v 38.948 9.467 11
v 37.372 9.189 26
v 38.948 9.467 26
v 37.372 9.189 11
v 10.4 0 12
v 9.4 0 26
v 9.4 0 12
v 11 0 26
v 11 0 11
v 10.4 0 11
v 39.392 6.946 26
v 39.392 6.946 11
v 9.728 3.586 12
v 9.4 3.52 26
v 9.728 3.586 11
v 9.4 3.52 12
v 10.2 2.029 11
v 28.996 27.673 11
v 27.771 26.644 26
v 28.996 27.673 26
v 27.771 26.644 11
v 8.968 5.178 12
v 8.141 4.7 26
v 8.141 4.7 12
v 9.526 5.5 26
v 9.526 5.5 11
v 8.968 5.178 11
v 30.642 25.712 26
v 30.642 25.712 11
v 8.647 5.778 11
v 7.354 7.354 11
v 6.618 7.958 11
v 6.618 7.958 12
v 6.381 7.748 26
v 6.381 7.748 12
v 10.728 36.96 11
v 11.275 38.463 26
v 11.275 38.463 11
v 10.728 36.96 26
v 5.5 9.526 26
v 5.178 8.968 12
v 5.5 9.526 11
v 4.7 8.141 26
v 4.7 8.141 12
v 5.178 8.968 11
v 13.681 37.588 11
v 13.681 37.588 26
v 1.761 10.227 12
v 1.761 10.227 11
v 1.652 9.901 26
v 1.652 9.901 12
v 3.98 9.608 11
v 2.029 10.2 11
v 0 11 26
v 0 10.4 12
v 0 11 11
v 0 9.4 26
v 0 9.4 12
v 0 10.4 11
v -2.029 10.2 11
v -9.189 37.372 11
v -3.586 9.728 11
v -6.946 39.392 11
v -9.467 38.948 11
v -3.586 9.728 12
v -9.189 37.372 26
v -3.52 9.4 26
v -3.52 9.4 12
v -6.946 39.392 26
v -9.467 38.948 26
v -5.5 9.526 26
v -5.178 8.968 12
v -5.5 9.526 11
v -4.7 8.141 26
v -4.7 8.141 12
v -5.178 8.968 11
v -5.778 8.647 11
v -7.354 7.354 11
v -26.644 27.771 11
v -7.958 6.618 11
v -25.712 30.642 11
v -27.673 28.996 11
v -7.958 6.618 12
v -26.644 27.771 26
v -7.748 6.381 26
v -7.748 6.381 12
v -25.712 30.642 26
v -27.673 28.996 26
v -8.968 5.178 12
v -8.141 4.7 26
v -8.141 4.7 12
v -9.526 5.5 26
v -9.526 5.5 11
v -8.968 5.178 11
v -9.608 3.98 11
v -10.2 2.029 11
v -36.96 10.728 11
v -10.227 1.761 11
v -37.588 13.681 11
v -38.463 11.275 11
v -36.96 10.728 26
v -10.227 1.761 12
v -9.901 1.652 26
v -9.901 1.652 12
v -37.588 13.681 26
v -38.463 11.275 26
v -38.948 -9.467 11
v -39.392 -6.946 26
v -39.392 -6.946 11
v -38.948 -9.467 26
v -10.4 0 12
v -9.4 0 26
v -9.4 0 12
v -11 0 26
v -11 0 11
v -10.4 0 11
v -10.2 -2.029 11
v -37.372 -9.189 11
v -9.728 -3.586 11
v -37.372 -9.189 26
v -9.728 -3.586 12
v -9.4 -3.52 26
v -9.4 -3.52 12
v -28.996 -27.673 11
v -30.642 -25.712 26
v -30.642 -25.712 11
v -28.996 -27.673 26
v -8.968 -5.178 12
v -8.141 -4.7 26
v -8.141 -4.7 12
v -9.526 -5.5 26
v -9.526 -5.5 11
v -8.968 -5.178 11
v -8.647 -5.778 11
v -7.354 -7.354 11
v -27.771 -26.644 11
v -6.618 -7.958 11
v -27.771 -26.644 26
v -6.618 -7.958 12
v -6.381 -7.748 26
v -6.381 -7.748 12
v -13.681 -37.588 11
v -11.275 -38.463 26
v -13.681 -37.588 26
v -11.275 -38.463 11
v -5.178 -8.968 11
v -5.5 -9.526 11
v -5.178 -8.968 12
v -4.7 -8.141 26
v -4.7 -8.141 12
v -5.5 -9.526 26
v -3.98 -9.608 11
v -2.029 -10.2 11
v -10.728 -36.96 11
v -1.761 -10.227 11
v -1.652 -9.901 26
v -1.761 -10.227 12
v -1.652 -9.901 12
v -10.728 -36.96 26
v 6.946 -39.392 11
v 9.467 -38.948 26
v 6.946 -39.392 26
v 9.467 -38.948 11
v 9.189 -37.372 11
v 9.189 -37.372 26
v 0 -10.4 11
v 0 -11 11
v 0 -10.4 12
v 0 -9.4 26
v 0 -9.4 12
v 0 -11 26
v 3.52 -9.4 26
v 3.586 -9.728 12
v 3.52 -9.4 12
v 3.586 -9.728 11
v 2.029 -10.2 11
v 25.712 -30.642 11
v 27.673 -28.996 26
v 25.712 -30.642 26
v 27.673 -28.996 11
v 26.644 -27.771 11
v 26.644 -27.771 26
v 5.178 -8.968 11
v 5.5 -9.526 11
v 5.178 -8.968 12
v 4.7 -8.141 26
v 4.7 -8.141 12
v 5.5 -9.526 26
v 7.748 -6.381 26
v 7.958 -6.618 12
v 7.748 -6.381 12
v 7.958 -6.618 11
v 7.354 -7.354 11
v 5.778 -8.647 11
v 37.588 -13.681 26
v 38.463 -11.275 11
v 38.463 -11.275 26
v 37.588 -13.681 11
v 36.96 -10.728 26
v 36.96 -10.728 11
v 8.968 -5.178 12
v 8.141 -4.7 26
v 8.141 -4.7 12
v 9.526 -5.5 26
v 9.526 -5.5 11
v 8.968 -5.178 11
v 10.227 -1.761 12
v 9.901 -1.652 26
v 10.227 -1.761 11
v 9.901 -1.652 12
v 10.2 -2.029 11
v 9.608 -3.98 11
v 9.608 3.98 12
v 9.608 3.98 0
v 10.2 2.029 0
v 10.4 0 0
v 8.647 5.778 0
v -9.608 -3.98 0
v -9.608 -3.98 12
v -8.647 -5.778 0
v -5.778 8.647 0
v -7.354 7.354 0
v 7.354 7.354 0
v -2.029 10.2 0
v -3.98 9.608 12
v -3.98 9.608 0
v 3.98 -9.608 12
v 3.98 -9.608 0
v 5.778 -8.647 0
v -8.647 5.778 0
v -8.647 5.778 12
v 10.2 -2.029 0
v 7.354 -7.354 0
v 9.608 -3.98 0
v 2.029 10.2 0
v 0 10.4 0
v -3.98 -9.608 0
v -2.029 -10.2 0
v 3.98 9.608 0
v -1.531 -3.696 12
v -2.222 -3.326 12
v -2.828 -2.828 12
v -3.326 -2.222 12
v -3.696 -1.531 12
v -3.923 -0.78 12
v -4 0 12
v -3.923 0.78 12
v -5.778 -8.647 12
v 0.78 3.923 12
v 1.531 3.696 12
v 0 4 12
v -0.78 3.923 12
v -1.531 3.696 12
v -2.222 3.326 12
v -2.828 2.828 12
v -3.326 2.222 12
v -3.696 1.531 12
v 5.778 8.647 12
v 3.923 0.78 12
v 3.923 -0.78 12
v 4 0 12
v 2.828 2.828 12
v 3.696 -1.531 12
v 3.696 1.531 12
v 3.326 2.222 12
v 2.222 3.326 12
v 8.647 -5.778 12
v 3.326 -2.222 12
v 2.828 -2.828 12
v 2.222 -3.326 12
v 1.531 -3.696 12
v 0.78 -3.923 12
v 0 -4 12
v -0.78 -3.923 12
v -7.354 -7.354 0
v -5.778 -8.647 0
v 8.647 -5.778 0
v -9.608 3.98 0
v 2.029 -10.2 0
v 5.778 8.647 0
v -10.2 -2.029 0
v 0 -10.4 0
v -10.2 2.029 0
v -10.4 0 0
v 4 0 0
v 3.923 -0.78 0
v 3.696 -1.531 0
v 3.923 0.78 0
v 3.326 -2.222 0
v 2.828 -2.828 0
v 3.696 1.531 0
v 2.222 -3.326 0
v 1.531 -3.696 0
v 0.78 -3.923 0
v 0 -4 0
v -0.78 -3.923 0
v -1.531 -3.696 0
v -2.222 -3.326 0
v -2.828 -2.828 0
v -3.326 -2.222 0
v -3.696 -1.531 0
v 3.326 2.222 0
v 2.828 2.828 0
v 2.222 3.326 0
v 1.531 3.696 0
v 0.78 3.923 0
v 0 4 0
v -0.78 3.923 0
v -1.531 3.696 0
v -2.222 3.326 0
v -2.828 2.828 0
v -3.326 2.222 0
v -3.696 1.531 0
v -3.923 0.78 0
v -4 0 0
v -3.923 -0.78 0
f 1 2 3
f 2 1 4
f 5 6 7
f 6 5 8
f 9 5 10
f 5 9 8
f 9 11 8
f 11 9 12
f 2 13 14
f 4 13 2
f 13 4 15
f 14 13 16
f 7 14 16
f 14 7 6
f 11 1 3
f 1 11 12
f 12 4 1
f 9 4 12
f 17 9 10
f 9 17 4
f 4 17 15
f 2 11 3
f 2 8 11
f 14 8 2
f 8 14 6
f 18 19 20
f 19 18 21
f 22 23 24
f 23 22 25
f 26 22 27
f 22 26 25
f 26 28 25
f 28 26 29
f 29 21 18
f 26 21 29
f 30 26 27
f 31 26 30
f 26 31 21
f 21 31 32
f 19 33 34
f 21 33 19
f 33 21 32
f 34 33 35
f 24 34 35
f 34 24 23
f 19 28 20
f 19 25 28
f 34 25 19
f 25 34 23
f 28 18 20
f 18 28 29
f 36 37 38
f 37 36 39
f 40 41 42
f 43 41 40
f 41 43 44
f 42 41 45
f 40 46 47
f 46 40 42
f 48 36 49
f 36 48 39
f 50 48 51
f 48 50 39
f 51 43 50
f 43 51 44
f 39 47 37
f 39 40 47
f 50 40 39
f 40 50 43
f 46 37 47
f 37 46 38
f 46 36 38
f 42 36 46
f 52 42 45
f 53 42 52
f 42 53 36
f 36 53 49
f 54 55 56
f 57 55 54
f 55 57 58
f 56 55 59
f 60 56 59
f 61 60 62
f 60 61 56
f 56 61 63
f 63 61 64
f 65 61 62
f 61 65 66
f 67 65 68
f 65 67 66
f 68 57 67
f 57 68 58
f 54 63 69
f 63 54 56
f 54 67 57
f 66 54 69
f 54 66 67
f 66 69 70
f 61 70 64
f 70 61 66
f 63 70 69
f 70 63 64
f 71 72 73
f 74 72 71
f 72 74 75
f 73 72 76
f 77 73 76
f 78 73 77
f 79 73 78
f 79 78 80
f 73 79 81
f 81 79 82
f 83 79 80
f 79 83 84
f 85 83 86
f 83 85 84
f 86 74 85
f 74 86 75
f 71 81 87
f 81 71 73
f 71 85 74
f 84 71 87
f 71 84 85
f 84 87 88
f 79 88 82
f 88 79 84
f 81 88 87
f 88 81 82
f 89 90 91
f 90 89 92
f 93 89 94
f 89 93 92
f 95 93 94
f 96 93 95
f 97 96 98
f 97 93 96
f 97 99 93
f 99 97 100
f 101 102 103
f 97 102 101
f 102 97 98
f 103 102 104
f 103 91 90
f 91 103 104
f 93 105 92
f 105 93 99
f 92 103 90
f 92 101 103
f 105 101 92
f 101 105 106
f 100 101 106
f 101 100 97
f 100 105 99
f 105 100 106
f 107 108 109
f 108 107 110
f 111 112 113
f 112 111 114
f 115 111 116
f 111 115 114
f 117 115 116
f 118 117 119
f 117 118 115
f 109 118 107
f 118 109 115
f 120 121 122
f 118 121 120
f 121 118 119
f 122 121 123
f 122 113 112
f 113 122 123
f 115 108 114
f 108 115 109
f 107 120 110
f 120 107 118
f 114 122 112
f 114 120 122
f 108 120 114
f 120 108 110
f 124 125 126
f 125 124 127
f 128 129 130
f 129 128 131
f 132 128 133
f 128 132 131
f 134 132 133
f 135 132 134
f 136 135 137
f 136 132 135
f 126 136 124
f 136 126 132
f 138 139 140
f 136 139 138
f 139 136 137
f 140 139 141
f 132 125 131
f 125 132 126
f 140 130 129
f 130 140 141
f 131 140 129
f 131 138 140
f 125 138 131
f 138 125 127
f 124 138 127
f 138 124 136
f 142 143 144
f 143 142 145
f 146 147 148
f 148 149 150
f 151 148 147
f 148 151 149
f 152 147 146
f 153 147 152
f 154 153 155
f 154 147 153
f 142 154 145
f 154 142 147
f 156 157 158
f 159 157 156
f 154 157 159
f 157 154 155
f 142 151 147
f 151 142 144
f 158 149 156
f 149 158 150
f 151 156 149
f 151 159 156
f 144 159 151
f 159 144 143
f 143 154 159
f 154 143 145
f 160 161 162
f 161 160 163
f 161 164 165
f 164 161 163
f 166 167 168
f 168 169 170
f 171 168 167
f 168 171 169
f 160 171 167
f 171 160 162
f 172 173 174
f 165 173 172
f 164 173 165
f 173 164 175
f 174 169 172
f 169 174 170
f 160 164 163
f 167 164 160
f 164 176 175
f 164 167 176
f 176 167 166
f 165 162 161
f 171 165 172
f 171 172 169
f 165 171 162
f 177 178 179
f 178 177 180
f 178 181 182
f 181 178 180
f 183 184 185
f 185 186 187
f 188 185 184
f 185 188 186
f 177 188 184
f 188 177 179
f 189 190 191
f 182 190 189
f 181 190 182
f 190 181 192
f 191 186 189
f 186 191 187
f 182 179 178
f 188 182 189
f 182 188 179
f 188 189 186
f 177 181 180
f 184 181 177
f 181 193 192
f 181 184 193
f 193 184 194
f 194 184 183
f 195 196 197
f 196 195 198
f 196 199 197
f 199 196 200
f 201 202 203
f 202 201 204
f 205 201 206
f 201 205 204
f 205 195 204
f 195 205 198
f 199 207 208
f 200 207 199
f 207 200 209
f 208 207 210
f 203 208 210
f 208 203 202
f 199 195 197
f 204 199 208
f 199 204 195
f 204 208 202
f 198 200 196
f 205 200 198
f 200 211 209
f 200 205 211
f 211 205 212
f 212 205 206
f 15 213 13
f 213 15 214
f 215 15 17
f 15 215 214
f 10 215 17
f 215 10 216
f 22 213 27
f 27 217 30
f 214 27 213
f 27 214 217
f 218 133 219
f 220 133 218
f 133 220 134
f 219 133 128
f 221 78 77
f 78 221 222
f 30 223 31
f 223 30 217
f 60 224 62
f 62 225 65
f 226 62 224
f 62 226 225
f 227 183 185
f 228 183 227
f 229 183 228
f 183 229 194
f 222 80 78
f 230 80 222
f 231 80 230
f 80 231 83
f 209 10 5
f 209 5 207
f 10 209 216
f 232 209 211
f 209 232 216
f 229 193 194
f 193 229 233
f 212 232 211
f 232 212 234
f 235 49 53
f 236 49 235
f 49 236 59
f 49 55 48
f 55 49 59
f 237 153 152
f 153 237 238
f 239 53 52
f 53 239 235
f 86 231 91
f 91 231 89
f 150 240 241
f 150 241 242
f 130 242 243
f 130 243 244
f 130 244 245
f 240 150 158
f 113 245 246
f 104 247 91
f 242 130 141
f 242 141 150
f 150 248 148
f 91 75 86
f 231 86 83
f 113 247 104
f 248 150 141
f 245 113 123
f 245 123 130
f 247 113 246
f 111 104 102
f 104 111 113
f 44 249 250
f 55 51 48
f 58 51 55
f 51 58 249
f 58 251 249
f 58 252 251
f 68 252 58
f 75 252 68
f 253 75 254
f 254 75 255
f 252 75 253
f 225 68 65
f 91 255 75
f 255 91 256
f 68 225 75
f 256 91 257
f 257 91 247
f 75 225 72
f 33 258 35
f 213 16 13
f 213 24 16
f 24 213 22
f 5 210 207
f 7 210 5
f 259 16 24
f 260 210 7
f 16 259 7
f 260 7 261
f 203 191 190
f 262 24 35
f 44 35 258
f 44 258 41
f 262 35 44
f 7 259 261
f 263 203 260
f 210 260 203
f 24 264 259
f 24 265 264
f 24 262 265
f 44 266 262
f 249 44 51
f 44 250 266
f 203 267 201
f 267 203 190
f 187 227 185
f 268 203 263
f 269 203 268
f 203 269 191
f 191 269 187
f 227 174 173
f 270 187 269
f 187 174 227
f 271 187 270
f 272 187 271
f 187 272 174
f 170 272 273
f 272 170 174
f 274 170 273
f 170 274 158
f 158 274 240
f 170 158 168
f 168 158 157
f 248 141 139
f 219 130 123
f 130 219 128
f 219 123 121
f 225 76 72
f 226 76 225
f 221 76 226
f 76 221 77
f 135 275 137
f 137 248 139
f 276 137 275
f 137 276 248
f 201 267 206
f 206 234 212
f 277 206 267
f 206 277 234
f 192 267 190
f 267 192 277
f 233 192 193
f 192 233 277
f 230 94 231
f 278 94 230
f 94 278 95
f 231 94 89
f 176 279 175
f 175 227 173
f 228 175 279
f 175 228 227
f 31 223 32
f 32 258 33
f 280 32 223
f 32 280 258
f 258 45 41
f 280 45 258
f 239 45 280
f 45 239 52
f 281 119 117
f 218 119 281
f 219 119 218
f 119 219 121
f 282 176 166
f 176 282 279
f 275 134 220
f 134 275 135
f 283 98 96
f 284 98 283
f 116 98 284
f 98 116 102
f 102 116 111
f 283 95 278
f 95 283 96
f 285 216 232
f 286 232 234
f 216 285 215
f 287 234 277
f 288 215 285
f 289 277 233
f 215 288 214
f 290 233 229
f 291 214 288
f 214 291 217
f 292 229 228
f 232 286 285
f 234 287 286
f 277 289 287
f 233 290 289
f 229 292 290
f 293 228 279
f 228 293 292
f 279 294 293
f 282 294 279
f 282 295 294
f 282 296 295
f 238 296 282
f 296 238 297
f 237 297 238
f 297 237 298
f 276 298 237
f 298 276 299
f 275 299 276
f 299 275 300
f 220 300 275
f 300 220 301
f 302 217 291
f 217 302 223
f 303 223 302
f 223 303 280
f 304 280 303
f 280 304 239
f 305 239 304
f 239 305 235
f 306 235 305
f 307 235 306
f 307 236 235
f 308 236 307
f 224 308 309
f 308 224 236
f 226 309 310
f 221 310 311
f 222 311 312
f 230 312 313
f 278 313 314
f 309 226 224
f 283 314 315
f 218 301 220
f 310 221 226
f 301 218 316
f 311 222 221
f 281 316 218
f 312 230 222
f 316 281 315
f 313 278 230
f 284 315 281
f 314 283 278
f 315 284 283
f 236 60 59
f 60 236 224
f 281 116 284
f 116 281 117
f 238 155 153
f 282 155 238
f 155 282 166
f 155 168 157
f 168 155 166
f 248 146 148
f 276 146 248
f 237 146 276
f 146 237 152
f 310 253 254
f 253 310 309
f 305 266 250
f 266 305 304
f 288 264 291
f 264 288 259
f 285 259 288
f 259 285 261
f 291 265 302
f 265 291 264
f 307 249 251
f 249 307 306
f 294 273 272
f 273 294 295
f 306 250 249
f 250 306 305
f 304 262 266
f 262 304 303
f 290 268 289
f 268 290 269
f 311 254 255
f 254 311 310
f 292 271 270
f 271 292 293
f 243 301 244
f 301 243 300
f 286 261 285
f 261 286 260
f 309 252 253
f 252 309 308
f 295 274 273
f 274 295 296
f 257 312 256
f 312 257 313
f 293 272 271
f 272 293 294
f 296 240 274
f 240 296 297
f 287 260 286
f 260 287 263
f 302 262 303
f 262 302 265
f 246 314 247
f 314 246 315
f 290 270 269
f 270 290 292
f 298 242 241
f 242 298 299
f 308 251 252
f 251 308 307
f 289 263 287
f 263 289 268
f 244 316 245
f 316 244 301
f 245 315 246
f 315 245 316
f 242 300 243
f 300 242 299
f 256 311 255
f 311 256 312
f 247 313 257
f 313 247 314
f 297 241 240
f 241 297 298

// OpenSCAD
$fn = 32;

// ----------------------------------------------------------------------
// Impeller: 80 mm, 12 blades, 26 mm tall
// ----------------------------------------------------------------------

// --- parameters (mm) ---
hub_d = 20.8;             // hub diameter
hub_h = 12;               // hub height
imp_d = 80;               // outer diameter over the blades
blades = 12;              // number of blades
blade_t = 1.6;            // blade thickness
blade_h = 14;             // blade height
blade_in_r = 9.4;         // blade root radius
blade_out_r = 38.4;       // blade tip radius
sweep = 10;               // blade sweep, degrees
bore_d = 8;               // shaft bore

module hub() {
  cylinder(h = hub_h, d = hub_d);
}

module blade() {
  /* blade swept between two boxes: hull of the root and the tip section */
  hull() {
    translate([blade_in_r, 0, hub_h - 1])
      cube([blade_t, blade_t * 2.2, blade_h + 1], center = false);
    rotate([0, 0, sweep])
      translate([blade_out_r, 0, hub_h - 1])
        cube([blade_t, blade_t * 1.6, blade_h + 1], center = false);
  }
}

module blades() {
  for (i = [0 : blades - 1])
    rotate([0, 0, i * 360 / blades]) blade();
}

difference() {
  union() {
    hub();
    blades();
  }
  translate([0, 0, -1]) cylinder(h = hub_h + blade_h + 0 + 3, d = bore_d);
}
